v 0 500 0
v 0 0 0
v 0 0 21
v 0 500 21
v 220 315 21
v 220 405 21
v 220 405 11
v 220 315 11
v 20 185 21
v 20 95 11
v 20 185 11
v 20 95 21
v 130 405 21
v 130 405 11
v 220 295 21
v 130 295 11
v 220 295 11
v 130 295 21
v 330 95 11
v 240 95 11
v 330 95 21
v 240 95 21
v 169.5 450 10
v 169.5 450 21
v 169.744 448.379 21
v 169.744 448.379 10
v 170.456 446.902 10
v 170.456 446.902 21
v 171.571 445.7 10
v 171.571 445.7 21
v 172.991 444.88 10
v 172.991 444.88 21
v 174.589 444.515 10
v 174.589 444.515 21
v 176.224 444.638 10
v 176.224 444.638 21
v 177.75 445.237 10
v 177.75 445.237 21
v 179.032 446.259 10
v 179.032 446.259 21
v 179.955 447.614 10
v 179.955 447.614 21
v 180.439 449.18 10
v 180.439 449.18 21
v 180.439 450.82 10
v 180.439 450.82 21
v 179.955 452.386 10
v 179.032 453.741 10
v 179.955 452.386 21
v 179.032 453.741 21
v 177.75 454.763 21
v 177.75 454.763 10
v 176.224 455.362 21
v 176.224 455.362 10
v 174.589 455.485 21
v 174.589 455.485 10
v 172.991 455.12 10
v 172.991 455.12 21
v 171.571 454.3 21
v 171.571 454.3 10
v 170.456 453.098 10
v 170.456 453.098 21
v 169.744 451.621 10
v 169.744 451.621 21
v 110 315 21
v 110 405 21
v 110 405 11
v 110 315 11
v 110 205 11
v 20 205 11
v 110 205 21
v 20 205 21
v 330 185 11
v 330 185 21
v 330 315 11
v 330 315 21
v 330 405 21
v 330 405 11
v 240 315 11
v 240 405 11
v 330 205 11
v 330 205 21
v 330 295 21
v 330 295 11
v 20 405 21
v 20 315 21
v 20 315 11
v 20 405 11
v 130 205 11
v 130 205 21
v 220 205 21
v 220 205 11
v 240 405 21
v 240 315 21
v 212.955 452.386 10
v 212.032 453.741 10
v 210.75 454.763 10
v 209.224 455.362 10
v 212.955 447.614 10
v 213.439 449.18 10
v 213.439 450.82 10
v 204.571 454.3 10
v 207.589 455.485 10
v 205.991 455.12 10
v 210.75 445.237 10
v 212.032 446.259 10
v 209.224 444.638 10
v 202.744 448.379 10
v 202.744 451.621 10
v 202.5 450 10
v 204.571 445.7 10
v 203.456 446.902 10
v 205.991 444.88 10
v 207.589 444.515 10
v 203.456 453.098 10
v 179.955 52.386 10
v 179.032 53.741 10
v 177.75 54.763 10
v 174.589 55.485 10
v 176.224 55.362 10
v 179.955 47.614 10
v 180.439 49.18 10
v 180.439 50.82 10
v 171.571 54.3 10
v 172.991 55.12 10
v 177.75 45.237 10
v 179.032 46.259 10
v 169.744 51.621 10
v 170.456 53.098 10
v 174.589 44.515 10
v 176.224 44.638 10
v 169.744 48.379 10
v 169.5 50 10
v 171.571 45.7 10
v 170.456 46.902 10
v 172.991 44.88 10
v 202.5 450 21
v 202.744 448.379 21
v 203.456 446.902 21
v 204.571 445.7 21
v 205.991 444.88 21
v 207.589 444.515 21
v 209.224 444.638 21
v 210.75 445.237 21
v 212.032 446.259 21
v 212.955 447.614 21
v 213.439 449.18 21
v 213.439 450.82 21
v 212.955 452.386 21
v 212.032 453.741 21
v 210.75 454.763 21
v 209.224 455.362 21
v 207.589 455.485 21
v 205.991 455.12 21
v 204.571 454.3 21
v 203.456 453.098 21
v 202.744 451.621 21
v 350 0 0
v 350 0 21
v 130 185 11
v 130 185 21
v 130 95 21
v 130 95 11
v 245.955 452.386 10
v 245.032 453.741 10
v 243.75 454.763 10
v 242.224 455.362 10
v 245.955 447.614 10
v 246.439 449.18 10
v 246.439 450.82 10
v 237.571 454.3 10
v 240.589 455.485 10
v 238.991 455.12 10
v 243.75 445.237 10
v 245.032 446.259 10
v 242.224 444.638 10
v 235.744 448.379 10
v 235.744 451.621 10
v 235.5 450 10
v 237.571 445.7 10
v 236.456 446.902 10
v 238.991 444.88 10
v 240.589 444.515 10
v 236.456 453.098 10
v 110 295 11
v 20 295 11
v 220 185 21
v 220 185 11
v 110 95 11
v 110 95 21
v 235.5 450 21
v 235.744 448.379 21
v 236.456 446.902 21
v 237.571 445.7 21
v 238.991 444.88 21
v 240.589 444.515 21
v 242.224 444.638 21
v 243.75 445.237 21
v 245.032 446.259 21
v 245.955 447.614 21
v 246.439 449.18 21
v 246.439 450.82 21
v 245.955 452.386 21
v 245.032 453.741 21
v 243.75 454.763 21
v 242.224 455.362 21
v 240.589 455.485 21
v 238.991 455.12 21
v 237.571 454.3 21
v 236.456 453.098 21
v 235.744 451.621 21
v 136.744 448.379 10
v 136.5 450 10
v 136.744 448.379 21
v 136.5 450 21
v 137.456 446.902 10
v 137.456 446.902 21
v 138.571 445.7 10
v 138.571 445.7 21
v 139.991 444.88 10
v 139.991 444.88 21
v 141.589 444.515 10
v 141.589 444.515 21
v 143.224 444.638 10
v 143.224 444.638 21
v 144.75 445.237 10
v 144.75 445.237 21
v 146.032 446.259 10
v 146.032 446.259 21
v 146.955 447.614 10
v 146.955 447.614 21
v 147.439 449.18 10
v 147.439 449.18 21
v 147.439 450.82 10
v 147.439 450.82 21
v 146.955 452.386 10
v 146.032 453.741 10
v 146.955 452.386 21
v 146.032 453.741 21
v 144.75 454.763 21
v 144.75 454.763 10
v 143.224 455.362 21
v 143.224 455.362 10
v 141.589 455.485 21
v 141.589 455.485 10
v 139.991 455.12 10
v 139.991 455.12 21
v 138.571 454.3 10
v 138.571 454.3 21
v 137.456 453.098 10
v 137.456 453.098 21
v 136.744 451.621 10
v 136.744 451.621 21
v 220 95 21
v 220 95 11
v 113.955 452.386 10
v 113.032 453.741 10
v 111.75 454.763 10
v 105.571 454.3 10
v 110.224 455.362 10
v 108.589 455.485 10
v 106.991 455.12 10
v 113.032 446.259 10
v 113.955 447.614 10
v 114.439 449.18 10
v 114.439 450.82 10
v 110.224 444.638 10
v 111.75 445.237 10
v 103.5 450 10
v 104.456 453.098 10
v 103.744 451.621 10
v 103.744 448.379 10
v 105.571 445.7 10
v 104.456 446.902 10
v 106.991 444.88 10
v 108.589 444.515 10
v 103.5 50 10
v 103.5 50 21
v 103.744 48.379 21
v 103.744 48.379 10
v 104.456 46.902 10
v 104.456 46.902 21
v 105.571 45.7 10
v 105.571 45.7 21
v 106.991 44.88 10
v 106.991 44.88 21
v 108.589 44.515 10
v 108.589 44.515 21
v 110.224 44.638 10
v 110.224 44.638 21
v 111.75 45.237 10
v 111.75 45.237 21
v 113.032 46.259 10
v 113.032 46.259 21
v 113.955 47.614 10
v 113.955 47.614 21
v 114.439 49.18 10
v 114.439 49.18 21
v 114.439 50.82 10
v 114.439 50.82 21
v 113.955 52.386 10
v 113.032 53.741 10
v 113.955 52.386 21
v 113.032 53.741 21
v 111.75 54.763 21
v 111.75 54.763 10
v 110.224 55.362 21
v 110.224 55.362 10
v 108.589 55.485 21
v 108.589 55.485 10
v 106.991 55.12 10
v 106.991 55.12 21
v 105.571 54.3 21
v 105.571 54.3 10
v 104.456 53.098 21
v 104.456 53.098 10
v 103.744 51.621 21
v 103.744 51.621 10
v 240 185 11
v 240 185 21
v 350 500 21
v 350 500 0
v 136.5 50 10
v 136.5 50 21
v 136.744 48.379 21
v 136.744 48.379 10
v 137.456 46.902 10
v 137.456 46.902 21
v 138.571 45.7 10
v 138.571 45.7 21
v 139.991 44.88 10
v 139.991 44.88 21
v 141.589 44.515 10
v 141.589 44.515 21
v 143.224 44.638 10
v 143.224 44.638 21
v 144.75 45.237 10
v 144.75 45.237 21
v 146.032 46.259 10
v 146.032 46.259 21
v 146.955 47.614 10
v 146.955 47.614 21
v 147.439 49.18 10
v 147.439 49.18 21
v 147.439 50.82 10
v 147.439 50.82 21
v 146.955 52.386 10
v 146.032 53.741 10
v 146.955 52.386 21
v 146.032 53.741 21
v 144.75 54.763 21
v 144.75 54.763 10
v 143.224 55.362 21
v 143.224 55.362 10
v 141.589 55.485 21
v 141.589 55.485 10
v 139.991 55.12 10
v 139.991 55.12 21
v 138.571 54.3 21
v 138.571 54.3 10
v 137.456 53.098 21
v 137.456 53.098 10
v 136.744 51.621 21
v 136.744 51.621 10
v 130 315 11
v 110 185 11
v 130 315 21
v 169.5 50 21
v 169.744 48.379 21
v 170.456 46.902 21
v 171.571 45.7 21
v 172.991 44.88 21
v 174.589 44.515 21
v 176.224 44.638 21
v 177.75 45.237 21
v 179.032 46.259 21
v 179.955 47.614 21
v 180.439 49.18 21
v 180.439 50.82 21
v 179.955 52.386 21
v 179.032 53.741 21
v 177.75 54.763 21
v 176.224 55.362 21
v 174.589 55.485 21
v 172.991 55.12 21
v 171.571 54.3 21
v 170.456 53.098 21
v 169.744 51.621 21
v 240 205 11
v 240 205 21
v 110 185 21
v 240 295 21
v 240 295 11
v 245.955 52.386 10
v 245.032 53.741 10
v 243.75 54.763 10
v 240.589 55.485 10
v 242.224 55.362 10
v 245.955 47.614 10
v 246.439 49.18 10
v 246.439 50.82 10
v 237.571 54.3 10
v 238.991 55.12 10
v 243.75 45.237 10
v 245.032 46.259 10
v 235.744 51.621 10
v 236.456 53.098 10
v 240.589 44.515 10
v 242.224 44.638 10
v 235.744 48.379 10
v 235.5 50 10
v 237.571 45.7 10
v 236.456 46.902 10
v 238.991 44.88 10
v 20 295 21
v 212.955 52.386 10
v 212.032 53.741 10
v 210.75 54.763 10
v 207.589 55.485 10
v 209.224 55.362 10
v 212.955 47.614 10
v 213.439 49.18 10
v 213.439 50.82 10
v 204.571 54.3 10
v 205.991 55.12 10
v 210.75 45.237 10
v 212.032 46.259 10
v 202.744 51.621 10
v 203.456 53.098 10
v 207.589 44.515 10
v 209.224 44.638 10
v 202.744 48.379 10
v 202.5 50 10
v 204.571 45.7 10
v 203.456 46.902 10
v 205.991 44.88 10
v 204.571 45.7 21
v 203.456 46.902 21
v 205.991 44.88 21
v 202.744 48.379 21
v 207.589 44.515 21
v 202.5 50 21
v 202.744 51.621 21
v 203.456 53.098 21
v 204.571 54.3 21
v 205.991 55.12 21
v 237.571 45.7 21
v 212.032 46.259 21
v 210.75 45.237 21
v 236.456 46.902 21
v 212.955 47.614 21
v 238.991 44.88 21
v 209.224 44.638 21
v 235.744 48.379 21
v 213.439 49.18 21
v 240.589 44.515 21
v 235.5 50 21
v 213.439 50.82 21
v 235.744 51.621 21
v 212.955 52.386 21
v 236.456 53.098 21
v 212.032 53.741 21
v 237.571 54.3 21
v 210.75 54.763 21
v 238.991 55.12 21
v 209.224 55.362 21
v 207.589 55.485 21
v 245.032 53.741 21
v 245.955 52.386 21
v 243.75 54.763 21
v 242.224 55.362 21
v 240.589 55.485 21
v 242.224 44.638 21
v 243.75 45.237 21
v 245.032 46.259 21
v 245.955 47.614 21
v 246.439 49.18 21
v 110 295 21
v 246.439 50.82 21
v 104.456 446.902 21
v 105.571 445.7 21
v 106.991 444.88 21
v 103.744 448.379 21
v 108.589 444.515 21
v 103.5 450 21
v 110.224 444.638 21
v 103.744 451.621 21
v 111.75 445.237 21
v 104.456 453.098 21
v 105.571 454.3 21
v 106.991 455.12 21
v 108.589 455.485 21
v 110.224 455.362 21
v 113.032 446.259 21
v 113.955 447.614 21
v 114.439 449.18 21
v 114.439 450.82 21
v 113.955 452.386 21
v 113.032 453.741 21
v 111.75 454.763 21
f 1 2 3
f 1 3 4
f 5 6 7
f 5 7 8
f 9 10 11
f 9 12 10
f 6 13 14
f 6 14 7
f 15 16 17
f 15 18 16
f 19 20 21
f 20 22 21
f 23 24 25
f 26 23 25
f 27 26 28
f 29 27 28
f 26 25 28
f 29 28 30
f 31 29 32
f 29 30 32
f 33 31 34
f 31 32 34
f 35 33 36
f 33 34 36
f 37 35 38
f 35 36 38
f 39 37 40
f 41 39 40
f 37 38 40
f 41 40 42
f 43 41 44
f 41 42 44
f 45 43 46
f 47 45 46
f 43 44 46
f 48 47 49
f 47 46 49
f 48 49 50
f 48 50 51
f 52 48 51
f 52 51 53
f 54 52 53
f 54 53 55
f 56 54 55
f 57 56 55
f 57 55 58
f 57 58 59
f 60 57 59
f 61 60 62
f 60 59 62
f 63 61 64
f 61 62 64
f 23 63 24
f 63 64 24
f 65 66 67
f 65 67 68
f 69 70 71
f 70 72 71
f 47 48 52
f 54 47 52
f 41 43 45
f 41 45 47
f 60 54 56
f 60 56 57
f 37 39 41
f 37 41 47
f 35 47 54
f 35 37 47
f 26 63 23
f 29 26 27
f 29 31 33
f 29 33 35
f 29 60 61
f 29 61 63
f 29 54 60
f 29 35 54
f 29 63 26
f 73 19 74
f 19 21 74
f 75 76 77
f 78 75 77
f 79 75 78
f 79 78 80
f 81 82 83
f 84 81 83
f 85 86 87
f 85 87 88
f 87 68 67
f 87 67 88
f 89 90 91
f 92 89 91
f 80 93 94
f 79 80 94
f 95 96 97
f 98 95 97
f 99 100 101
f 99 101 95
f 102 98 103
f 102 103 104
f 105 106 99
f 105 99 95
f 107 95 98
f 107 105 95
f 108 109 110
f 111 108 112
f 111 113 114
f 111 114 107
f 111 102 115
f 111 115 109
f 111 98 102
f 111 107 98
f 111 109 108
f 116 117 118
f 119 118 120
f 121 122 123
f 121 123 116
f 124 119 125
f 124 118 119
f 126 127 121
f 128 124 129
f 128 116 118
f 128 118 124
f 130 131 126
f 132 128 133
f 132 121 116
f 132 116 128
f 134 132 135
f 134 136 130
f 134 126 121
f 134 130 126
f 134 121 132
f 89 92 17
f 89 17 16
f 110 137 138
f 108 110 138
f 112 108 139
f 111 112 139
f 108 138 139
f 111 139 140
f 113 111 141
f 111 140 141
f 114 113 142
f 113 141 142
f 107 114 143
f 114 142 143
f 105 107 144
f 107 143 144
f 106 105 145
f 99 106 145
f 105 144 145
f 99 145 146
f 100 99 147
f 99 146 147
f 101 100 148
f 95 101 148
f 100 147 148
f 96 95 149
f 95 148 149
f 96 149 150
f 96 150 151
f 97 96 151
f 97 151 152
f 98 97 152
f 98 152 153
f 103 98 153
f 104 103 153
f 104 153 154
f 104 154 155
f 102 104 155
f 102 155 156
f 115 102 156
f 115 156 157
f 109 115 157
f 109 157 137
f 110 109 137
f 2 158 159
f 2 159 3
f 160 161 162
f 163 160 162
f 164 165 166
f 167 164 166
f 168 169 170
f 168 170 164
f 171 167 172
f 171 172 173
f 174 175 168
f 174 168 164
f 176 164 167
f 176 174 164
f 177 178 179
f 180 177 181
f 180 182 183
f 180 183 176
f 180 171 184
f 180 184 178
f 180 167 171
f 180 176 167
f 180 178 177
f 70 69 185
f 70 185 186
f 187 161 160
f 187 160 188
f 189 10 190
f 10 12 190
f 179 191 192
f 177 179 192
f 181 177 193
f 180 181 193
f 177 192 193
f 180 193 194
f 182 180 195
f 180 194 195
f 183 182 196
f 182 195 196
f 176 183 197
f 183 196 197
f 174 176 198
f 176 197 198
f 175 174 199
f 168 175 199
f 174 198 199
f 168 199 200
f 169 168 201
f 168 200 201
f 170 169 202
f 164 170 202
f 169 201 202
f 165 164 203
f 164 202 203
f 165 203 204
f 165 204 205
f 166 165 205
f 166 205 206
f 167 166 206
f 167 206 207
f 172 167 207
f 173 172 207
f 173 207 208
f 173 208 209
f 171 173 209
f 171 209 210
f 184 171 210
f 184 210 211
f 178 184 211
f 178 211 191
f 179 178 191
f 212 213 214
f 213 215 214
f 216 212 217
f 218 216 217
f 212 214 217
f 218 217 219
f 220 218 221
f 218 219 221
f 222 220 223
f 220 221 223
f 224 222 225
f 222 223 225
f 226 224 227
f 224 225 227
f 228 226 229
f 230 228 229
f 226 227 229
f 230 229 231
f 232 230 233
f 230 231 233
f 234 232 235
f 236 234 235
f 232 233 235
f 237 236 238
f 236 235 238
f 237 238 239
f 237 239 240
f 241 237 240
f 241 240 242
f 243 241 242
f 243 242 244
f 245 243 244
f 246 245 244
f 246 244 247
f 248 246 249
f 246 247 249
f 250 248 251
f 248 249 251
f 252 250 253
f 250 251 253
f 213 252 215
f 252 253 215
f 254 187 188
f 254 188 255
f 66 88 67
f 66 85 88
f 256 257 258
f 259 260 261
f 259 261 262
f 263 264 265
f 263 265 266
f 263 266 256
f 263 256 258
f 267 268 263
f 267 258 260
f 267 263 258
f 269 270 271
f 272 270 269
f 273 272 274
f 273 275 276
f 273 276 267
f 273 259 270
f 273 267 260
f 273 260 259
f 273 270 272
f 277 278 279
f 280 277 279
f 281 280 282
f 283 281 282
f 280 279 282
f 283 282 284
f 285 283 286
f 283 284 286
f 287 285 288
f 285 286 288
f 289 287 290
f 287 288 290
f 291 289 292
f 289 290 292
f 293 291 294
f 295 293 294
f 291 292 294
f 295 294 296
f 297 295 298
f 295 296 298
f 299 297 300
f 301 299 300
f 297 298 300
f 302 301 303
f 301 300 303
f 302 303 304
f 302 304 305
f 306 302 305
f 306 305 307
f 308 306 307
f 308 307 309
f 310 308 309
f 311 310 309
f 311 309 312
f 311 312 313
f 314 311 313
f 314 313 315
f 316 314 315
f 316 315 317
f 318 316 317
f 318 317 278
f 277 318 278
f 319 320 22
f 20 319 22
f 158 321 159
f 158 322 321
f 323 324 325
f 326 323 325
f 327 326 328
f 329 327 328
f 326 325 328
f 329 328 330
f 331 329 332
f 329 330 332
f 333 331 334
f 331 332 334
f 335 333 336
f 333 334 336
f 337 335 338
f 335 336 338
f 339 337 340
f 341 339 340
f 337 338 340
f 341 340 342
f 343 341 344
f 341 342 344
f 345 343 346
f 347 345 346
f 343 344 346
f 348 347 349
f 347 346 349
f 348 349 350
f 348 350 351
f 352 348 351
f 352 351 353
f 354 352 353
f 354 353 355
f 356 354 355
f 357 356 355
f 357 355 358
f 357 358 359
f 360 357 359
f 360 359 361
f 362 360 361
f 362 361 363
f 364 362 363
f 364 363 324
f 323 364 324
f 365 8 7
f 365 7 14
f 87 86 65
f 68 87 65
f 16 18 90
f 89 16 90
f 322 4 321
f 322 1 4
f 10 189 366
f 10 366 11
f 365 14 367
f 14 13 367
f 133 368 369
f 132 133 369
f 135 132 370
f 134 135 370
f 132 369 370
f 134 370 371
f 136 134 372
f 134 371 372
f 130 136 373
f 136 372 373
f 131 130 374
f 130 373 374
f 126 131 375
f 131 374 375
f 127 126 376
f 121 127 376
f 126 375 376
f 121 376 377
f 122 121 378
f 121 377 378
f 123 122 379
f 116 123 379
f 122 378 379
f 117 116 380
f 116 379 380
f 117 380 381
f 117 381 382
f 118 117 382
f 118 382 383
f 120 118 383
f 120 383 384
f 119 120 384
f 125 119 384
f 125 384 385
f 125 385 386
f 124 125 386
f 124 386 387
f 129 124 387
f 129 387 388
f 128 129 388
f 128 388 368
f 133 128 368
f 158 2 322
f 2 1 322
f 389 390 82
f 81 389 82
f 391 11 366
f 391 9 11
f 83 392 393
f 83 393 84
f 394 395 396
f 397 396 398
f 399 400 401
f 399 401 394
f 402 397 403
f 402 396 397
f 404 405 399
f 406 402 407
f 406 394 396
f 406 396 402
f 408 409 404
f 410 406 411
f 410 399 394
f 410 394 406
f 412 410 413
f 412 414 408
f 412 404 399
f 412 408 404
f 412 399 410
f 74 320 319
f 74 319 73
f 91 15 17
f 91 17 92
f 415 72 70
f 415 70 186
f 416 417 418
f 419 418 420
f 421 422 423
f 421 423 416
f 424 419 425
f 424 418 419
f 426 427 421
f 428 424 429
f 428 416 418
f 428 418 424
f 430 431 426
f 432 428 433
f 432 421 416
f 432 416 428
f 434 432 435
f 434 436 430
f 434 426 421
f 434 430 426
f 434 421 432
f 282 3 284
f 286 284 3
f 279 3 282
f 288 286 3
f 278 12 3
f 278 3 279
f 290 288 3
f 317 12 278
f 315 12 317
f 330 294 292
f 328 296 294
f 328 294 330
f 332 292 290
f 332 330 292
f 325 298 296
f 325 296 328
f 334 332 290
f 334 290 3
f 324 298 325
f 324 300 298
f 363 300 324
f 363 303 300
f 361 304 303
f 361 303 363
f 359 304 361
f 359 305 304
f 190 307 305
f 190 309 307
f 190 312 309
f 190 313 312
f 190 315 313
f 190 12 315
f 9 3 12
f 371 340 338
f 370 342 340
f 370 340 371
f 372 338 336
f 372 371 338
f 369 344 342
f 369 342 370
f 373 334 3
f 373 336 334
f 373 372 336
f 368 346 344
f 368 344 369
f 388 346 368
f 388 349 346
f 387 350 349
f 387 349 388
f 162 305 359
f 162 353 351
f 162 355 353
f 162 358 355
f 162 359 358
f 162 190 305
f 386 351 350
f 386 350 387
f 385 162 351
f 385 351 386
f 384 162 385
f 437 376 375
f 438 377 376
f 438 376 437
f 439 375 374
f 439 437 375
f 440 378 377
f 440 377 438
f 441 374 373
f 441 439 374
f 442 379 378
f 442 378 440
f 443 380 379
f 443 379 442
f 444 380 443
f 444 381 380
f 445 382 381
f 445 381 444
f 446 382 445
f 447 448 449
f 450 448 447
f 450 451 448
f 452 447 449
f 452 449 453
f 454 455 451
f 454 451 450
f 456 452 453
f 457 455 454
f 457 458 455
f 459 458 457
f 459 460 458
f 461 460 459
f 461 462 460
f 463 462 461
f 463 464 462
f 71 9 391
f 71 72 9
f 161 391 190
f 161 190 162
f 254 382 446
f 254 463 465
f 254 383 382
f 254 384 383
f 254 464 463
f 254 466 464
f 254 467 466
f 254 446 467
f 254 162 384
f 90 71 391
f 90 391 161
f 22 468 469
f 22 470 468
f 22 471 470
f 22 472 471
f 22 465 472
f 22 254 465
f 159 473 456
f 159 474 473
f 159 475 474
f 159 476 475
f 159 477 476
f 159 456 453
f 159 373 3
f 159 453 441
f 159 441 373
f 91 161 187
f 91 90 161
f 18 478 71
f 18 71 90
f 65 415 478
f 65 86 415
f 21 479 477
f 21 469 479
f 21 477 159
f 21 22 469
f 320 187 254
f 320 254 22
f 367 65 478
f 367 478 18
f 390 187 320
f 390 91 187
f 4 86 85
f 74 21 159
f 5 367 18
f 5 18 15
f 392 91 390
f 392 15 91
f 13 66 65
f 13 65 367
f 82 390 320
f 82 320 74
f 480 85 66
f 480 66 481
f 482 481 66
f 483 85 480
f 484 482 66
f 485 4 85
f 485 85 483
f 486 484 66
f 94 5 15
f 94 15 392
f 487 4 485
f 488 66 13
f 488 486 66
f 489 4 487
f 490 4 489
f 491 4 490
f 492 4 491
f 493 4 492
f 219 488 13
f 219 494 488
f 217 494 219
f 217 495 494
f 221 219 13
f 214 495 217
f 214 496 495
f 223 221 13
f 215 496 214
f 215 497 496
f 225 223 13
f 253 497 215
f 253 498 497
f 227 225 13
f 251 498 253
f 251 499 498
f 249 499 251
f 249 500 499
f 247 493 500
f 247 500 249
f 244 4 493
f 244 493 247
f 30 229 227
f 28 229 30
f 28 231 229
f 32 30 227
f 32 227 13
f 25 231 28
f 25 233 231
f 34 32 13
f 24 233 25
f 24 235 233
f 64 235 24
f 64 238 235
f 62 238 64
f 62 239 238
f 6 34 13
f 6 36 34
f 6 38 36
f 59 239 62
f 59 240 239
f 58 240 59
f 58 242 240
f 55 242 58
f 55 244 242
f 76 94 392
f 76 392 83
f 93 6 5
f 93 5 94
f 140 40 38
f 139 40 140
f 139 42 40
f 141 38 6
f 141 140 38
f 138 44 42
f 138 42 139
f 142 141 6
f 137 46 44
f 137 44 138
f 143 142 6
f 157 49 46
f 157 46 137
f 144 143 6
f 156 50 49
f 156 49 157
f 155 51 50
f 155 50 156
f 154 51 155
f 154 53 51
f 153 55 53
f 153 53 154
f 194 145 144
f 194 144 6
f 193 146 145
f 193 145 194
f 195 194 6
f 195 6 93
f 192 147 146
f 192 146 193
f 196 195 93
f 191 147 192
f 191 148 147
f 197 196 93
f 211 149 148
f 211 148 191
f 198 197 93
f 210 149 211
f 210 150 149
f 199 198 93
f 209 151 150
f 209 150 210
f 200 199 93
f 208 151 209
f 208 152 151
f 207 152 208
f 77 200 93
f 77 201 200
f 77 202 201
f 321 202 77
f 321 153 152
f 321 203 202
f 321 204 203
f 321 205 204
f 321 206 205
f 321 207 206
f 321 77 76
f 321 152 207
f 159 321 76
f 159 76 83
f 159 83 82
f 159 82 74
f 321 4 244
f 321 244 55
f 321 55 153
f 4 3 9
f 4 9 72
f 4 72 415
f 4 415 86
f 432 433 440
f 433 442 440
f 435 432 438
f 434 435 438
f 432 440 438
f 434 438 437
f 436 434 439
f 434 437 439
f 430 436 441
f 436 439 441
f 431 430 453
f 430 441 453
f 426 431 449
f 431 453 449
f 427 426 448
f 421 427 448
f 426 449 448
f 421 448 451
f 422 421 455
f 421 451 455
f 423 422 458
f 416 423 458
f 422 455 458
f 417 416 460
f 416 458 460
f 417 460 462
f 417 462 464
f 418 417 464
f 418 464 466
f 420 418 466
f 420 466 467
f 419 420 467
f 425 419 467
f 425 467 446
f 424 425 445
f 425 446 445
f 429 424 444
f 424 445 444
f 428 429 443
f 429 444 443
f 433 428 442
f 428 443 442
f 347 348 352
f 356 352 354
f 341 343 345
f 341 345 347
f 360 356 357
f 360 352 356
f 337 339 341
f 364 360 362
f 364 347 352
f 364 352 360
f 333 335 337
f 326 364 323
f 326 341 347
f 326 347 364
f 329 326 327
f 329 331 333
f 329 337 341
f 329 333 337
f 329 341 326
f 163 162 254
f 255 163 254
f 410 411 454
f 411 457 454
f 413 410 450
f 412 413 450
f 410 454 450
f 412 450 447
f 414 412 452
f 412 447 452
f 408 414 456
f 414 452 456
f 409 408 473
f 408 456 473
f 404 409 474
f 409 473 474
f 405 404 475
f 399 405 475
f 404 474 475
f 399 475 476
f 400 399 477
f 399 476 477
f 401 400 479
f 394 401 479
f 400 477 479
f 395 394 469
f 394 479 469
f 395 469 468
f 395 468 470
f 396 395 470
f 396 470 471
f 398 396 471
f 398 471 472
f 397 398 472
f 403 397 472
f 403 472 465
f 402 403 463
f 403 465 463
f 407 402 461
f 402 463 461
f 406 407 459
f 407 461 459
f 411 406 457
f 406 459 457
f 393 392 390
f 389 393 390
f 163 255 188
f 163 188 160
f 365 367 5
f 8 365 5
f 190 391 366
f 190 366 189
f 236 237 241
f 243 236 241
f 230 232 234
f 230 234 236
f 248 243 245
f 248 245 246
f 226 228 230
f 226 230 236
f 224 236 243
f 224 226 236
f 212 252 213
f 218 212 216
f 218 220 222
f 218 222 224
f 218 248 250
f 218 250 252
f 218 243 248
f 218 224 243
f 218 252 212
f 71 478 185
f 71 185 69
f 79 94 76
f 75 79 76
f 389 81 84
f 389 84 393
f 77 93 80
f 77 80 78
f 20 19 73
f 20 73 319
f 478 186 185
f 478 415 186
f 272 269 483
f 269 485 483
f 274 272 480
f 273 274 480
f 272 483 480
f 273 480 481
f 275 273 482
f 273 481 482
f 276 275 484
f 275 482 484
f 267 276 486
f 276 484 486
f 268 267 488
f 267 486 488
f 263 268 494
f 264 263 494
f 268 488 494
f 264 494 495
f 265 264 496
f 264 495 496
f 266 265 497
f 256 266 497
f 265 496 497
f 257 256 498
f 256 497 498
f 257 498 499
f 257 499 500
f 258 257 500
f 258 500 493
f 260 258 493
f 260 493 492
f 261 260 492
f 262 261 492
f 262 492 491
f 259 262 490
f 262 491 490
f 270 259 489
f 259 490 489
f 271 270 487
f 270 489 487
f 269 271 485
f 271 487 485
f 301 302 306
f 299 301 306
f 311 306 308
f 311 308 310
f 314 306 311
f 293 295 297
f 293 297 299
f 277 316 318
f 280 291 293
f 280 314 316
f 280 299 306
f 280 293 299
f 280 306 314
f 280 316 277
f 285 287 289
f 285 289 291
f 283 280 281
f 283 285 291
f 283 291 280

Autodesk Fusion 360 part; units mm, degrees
sketch "Sketch1" plane through (0, 0, 0) normal (0, 0, 1) x (1, 0, 0)
  line L0 (0, 0) -> (0, 500)
  line L1 (0, 500) -> (350, 500)
  line L2 (350, 500) -> (350, 0)
  line L3 (350, 0) -> (0, 0)
  dimension "d6" = 500
  dimension "d7" = 350
  dimension "d8" = 500
  dimension "d9" = 350
extrude "Extrude1" add sketch "Sketch1" along normal blind 21
sketch "Sketch2" plane through (0, 0, 21) normal (0, 0, 1) x (-1, 0, 0)
  line L0 (-350, 0) -> (-350, -500)
  line L1 (-350, -500) -> (0, -500)
  line L2 (0, -500) -> (0, 0)
  line L3 (0, 0) -> (-350, 0)
  line L4 (0, 0) -> (-20, 0)
  line L5 (-350, 0) -> (-330, 0)
  line L6 (-330, 0) -> (-330, -500)
  line L7 (-20, 0) -> (-20, -500)
  line L8 (-20, -500) -> (-110, -500)
  line L9 (-110, -500) -> (-130, -500)
  line L10 (-130, -500) -> (-220, -500)
  line L11 (-220, -500) -> (-240, -500)
  line L12 (-240, -500) -> (-330, -500)
  line L13 (-110, -500) -> (-110, 0)
  line L14 (-130, -500) -> (-130, 0)
  line L15 (-220, -500) -> (-220, 0)
  line L16 (-240, -500) -> (-240, 0)
  line L17 (0, 0) -> (0, -95)
  line L18 (0, -500) -> (0, -405)
  line L19 (0, -405) -> (-350, -405)
  line L20 (0, -95) -> (-350, -95)
  line L21 (0, -405) -> (0, -315)
  line L22 (0, -315) -> (0, -295)
  line L23 (0, -295) -> (0, -205)
  line L24 (0, -205) -> (0, -185)
  line L25 (0, -185) -> (0, -95)
  line L26 (0, -185) -> (-350, -185)
  line L27 (0, -205) -> (-350, -205)
  line L28 (0, -295) -> (-350, -295)
  line L29 (0, -315) -> (-350, -315)
  dimension "d13" = 20
  dimension "d14" = 500
  dimension "d16" = 90
  dimension "d19" = 20
  dimension "d27" = 95
  dimension "d28" = 95
  dimension "d29" = 350
  dimension "d31" = 90
  dimension "d32" = 20
  dimension "d34" = 90
  dimension "d35" = 20
extrude "Extrude2" cut sketch "Sketch2" against normal blind 10 contours L6 L16 L20 L26 | L6 L16 L27 L28 | L14 L15 L20 L26 | L6 L16 L19 L29 | L14 L15 L27 L28 | L7 L13 L20 L26 | L14 L15 L19 L29 | L7 L13 L27 L28 | L7 L13 L19 L29
sketch "Sketch3" plane through (0, 0, 21) normal (0, 0, 1) x (-1, 0, 0)
  line L0 (-330, -95) -> (-240, -95)
  line L1 (-240, -95) -> (-240, -185)
  line L2 (-240, -185) -> (-330, -185)
  line L3 (-330, -185) -> (-330, -95)
  line L4 (-130, -205) -> (-130, -295)
  line L5 (-130, -295) -> (-220, -295)
  line L6 (-220, -295) -> (-220, -205)
  line L7 (-220, -205) -> (-130, -205)
  line L8 (-110, -405) -> (-110, -315)
  line L9 (-110, -315) -> (-20, -315)
  line L10 (-20, -315) -> (-20, -405)
  line L11 (-20, -405) -> (-110, -405)
  line L12 (-110, -295) -> (-110, -205)
  line L13 (-110, -205) -> (-20, -205)
  line L14 (-20, -205) -> (-20, -295)
  line L15 (-20, -295) -> (-110, -295)
  line L16 (-130, -95) -> (-130, -185)
  line L17 (-130, -185) -> (-220, -185)
  line L18 (-220, -185) -> (-220, -95)
  line L19 (-220, -95) -> (-130, -95)
  line L20 (-330, -205) -> (-240, -205)
  line L21 (-240, -205) -> (-240, -295)
  line L22 (-240, -295) -> (-330, -295)
  line L23 (-330, -295) -> (-330, -205)
  line L24 (-130, -315) -> (-130, -405)
  line L25 (-130, -405) -> (-220, -405)
  line L26 (-220, -405) -> (-220, -315)
  line L27 (-220, -315) -> (-130, -315)
  line L28 (-330, -315) -> (-240, -315)
  line L29 (-240, -315) -> (-240, -405)
  line L30 (-240, -405) -> (-330, -405)
  line L31 (-330, -405) -> (-330, -315)
  line L32 (-110, -185) -> (-110, -95)
  line L33 (-110, -95) -> (-20, -95)
  line L34 (-20, -95) -> (-20, -185)
  line L35 (-20, -185) -> (-110, -185)
  line L36 (0, 0) -> (-175, 0)
  circle A0 centre (-175, -50) radius 5.5
  circle A1 centre (-208, -50) radius 5.5
  circle A2 centre (-241, -50) radius 5.5
  circle A3 centre (-142, -50) radius 5.5
  circle A4 centre (-109, -50) radius 5.5
  line L37 (0, -500) -> (-175, -500)
  circle A5 centre (-142, -450) radius 5.5
  circle A6 centre (-109, -450) radius 5.5
  circle A7 centre (-208, -450) radius 5.5
  circle A8 centre (-175, -450) radius 5.5
  circle A9 centre (-241, -450) radius 5.5
  line L38 (-350, 0) -> (-350, -500)
  line L39 (-350, -500) -> (0, -500)
  line L40 (0, -500) -> (0, 0)
  line L41 (0, 0) -> (-350, 0)
  dimension "d43" = 175
  dimension "d44" = 50
  dimension "d46" = 33
  dimension "d55" = 11
  dimension "d56" = 175
  dimension "d57" = 50
  dimension "d60" = 33
  dimension "d64" = 11
extrude "Extrude3" cut sketch "Sketch3" against normal blind 11 contours A0 | A1 | A2 | A3 | A4 | A5 | A6 | A7 | A8 | A9
sketch "Sketch5" plane through (0, 0, 21) normal (0, 0, 1) x (-1, 0, 0)
  circle A0 centre (-175, -50) radius 5.5
  circle A1 centre (-208, -450) radius 5.5
  circle A2 centre (-109, -450) radius 5.5
  circle A3 centre (-241, -450) radius 5.5
  circle A4 centre (-208, -50) radius 5.5
  circle A5 centre (-142, -50) radius 5.5
  circle A6 centre (-175, -450) radius 5.5
  circle A7 centre (-142, -450) radius 5.5
  circle A8 centre (-109, -50) radius 5.5
  circle A9 centre (-241, -50) radius 5.5
  line L0 (-110, -185) -> (-110, -95)
  line L1 (-110, -95) -> (-20, -95)
  line L2 (-20, -95) -> (-20, -185)
  line L3 (-20, -185) -> (-110, -185)
  line L4 (-330, -315) -> (-240, -315)
  line L5 (-240, -315) -> (-240, -405)
  line L6 (-240, -405) -> (-330, -405)
  line L7 (-330, -405) -> (-330, -315)
  line L8 (-130, -315) -> (-130, -405)
  line L9 (-130, -405) -> (-220, -405)
  line L10 (-220, -405) -> (-220, -315)
  line L11 (-220, -315) -> (-130, -315)
  line L12 (-330, -205) -> (-240, -205)
  line L13 (-240, -205) -> (-240, -295)
  line L14 (-240, -295) -> (-330, -295)
  line L15 (-330, -295) -> (-330, -205)
  line L16 (-130, -95) -> (-130, -185)
  line L17 (-130, -185) -> (-220, -185)
  line L18 (-220, -185) -> (-220, -95)
  line L19 (-220, -95) -> (-130, -95)
  line L20 (-110, -295) -> (-110, -205)
  line L21 (-110, -205) -> (-20, -205)
  line L22 (-20, -205) -> (-20, -295)
  line L23 (-20, -295) -> (-110, -295)
  line L24 (-110, -405) -> (-110, -315)
  line L25 (-110, -315) -> (-20, -315)
  line L26 (-20, -315) -> (-20, -405)
  line L27 (-20, -405) -> (-110, -405)
  line L28 (-130, -205) -> (-130, -295)
  line L29 (-130, -295) -> (-220, -295)
  line L30 (-220, -295) -> (-220, -205)
  line L31 (-220, -205) -> (-130, -205)
  line L32 (-330, -95) -> (-240, -95)
  line L33 (-240, -95) -> (-240, -185)
  line L34 (-240, -185) -> (-330, -185)
  line L35 (-330, -185) -> (-330, -95)
  line L36 (-350, 0) -> (-350, -500)
  line L37 (-350, -500) -> (0, -500)
  line L38 (0, -500) -> (0, 0)
  line L39 (0, 0) -> (-350, 0)
equation "lengd = 500 mm" comment "Lengd spilsins"
equation "breydd = 350 mm" comment "Breydd spilsins"
equation "þykkt = 21 mm" comment "Þykkt efnisins"
equation "dypt_holfa = 10 mm" comment "Dýpt hólfanna fyrir leikmenn"
equation "veggir = 20 mm" comment "Stærð skilveggja"
equation "d6 = lengd"
equation "d7 = breydd"
equation "d8 = lengd"
equation "d9 = breydd"
equation "d10 = þykkt"
equation "d13 = veggir"
equation "d14 = lengd"
equation "d16 = ( breydd - veggir ) / 3 - veggir"
equation "d19 = veggir"
equation "d27 = ( ( lengd - breydd ) / 2 ) + veggir"
equation "d28 = ( ( lengd - breydd ) / 2 ) + veggir"
equation "d29 = breydd"
equation "d31 = ( ( breydd - veggir ) / 3 ) - veggir"
equation "d32 = veggir"
equation "d34 = ( ( breydd - veggir ) / 3 ) - veggir"
equation "d35 = veggir"
equation "d36 = -dypt_holfa"
equation "stiga_dýpt = 11 mm" comment "Dýptin á holunum fyrir stiga talninguna"
equation "renna_stiga = 5 mm" comment "Dýptina á rennunum milli staga hólfa"
equation "renna_breydd = 5 mm" comment "Breyddin á rennunni"
equation "d43 = breydd / 2"
equation "d44 = ( lengd / 10 )"
equation "d46 = stiga_dýpt * 3"
equation "d55 = stiga_dýpt"
equation "d56 = breydd / 2"
equation "d57 = lengd / 10"
equation "d60 = stiga_dýpt * 3"
equation "d64 = stiga_dýpt"
equation "d68 = -stiga_dýpt"
